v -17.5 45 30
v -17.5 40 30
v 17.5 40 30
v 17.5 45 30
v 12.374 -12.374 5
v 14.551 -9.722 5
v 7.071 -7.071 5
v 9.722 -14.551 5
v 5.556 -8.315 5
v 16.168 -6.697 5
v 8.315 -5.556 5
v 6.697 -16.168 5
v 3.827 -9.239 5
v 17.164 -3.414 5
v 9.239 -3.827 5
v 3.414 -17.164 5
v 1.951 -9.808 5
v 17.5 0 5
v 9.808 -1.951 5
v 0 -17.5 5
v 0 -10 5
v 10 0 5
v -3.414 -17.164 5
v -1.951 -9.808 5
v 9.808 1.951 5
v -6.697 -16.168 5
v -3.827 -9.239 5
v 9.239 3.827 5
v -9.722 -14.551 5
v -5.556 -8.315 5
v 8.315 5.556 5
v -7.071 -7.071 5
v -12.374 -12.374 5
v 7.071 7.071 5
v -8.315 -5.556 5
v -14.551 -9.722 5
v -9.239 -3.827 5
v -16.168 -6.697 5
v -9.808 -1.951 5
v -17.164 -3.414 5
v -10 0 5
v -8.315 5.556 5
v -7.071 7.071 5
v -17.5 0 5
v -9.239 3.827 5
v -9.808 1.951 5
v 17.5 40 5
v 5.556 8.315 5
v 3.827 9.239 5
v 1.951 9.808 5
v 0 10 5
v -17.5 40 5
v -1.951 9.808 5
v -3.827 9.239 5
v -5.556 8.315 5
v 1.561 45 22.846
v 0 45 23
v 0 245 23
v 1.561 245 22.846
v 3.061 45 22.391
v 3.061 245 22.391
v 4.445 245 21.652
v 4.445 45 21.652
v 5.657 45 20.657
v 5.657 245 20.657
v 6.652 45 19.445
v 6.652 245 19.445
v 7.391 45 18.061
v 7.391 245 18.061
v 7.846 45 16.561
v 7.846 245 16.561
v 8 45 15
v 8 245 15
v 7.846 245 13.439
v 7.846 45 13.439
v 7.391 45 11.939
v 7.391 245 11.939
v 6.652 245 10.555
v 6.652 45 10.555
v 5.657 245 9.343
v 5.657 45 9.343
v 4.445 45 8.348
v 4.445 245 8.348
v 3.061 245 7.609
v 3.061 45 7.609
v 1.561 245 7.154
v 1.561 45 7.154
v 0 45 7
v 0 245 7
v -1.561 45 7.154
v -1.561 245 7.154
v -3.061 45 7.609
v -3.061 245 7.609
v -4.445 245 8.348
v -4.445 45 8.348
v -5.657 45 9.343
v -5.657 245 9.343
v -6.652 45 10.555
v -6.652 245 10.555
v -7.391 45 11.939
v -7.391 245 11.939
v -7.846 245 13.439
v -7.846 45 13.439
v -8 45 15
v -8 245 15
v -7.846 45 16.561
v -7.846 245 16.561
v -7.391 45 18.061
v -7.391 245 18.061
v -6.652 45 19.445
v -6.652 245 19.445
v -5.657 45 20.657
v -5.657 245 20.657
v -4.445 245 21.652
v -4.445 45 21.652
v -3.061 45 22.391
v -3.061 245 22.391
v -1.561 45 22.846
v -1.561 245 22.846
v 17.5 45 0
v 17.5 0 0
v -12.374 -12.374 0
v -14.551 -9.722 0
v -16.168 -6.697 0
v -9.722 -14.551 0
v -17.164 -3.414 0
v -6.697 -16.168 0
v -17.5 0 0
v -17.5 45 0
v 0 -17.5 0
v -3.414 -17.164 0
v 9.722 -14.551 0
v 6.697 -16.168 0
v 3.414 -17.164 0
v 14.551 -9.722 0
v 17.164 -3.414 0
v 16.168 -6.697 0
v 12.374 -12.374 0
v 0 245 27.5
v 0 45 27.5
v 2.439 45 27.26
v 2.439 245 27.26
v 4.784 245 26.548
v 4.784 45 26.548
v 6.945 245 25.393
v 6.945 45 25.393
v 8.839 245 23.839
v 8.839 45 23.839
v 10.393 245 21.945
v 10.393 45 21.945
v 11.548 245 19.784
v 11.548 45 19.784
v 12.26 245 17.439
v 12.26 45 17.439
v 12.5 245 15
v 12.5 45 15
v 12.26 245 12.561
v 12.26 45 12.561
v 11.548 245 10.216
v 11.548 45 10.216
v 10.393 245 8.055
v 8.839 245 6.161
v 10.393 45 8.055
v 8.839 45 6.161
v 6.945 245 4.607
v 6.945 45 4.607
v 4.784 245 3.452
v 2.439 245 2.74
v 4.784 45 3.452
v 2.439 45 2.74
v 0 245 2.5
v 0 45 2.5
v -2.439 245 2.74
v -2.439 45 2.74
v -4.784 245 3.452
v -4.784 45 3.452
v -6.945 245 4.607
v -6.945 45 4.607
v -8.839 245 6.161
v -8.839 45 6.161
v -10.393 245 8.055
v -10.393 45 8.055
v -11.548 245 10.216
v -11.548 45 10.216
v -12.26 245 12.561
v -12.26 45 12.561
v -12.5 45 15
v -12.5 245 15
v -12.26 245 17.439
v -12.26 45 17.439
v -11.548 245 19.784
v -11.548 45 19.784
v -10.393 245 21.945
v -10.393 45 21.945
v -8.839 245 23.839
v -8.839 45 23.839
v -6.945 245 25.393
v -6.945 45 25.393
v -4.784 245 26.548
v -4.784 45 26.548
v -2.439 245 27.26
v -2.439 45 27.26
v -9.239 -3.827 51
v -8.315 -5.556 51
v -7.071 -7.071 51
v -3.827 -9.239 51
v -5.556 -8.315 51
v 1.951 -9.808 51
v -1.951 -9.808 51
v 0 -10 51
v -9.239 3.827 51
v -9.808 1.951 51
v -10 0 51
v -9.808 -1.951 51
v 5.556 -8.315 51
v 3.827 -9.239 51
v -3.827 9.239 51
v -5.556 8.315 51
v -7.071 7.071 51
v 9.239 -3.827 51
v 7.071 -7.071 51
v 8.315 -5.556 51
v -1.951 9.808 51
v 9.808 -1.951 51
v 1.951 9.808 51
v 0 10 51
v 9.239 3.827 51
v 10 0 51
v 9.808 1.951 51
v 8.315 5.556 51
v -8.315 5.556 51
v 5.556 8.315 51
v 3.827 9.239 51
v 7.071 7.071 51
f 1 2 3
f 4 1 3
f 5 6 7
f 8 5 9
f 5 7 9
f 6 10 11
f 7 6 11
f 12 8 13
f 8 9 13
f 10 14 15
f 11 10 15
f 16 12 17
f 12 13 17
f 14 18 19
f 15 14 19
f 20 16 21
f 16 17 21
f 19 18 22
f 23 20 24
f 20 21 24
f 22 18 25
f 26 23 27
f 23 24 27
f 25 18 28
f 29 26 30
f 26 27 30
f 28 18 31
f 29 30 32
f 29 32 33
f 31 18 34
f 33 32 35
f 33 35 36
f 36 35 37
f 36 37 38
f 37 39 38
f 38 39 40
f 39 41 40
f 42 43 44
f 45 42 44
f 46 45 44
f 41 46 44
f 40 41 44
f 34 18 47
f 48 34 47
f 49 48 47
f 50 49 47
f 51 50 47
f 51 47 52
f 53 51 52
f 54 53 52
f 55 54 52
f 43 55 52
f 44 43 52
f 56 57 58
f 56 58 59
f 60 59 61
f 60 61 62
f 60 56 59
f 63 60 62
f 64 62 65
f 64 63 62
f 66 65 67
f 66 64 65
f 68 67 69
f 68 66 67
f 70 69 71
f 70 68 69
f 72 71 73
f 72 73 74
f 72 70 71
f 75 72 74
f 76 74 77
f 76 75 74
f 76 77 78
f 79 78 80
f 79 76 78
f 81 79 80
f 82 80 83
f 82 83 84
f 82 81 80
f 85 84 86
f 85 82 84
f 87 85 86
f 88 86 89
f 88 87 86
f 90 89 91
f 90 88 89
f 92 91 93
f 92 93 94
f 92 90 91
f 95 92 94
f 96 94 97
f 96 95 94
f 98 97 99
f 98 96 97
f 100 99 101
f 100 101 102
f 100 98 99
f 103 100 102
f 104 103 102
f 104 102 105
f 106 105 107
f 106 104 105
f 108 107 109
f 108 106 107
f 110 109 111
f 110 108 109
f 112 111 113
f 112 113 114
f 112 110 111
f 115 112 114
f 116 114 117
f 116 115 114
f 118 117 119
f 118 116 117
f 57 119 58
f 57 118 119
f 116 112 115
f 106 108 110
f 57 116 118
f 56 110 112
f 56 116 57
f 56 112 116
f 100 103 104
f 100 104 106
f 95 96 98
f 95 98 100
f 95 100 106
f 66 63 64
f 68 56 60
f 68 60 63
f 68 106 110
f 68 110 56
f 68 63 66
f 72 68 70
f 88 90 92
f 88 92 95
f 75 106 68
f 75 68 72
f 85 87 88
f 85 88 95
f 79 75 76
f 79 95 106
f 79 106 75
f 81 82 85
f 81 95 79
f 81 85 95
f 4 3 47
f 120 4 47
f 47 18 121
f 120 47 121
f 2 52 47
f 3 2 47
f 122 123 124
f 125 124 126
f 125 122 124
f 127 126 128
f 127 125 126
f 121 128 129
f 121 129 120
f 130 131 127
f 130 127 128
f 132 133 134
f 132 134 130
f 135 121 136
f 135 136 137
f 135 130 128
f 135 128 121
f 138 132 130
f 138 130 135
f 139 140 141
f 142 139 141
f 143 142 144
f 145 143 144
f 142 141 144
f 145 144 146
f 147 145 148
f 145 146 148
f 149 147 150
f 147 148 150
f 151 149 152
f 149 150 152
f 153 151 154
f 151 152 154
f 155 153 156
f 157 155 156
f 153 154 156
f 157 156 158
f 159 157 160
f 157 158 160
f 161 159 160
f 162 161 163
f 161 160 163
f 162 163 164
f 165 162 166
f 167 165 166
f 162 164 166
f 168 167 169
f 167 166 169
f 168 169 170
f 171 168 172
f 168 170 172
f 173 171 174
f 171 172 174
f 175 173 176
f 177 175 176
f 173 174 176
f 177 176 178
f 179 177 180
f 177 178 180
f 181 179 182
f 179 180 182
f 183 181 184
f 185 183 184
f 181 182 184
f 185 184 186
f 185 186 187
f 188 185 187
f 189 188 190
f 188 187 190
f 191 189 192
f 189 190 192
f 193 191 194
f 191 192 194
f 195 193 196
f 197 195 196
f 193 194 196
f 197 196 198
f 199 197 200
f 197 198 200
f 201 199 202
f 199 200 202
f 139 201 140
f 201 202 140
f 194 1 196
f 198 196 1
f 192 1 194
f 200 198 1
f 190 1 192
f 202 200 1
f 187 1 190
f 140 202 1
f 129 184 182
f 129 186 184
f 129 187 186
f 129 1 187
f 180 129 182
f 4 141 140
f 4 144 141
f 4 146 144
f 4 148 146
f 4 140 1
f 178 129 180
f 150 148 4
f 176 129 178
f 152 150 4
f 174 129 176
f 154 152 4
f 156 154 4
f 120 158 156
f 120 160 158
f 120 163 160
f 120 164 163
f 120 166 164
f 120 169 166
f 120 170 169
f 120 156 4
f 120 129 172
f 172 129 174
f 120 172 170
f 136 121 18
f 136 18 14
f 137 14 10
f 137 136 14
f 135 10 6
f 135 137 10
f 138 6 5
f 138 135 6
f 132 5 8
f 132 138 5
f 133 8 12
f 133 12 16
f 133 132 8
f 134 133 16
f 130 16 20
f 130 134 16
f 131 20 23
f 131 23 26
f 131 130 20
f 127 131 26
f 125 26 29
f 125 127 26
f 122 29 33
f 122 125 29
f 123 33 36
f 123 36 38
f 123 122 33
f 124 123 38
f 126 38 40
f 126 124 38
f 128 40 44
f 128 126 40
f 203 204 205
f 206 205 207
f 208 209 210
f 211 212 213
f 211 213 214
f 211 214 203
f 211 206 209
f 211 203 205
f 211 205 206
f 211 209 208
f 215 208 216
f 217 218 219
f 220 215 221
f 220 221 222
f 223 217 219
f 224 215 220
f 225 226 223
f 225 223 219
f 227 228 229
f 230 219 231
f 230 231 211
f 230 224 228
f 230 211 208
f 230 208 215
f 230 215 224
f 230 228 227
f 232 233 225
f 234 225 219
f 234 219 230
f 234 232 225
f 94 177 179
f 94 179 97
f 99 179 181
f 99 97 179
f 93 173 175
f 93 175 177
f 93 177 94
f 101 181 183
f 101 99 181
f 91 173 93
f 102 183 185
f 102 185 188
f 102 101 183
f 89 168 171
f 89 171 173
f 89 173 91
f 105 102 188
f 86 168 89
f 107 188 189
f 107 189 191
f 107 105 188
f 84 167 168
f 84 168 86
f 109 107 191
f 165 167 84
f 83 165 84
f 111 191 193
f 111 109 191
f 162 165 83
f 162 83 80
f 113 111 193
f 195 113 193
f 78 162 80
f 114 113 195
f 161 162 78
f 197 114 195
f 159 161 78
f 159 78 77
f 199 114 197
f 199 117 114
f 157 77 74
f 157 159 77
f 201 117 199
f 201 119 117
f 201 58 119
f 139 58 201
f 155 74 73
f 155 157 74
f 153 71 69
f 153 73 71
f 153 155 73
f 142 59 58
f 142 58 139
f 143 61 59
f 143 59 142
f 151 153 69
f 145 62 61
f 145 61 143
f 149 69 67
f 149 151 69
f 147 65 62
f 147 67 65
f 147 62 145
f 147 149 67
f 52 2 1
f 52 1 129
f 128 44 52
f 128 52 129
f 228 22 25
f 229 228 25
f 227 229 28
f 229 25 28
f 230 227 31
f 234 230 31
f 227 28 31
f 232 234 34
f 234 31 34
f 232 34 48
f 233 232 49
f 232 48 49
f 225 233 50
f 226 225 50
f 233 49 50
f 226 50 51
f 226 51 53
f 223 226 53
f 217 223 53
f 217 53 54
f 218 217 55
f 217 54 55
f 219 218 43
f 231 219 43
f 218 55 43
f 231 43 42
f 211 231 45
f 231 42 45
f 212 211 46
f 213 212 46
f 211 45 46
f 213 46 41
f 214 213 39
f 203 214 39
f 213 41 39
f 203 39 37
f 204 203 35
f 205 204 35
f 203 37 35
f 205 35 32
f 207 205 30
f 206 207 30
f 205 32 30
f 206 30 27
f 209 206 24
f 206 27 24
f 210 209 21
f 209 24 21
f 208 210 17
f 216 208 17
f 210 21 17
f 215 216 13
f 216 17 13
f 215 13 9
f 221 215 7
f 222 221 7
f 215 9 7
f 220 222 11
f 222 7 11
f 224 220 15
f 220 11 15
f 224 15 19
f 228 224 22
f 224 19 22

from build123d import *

# Parameters (mm, degrees)
EXTRUDE_1_DEPTH = 5
SKETCH_2_R      = 10
EXTRUDE_2_DEPTH = 46
SKETCH_4_W      = 35
SKETCH_4_H      = 30
EXTRUDE_3_DEPTH = 5
SKETCH_5_R      = 12.5
SKETCH_5_R_2    = 8
EXTRUDE_4_DEPTH = 200


with BuildPart() as part:
    # 草图1 → 凸台-拉伸1 (new body)
    with BuildSketch(Plane.XY):
        with BuildLine():
            Line((-17.5, 0), (-17.5, 40))
            Line((-17.5, 40), (17.5, 40))
            Line((17.5, 40), (17.5, 0))
            ThreePointArc((17.5, 0), (0, -17.5), (-17.5, 0))
        make_face()
    extrude(amount=EXTRUDE_1_DEPTH)

    # 草图2 → 凸台-拉伸2 (add)
    with BuildSketch(Plane.XY.offset(5)):
        Circle(SKETCH_2_R)
    extrude(amount=EXTRUDE_2_DEPTH)

    # 草图4 → 凸台-拉伸3 (add)
    with BuildSketch(Plane(origin=(0, 40, 0), x_dir=(1, 0, 0), z_dir=(0, 1, 0))):
        with Locations((0, -15)):
            Rectangle(SKETCH_4_W, SKETCH_4_H)
    extrude(amount=EXTRUDE_3_DEPTH)

    # 草图5 → 凸台-拉伸4 (add)
    with BuildSketch(Plane(origin=(0, 45, 0), x_dir=(1, 0, 0), z_dir=(0, 1, 0))):
        with Locations(Location((0, -15, 0), (0, 0, 270))):
            Circle(SKETCH_5_R)
        with Locations(Location((0, -15, 0), (0, 0, 270))):
            Circle(SKETCH_5_R_2, mode=Mode.SUBTRACT)
    extrude(amount=EXTRUDE_4_DEPTH)


solid = part.part
